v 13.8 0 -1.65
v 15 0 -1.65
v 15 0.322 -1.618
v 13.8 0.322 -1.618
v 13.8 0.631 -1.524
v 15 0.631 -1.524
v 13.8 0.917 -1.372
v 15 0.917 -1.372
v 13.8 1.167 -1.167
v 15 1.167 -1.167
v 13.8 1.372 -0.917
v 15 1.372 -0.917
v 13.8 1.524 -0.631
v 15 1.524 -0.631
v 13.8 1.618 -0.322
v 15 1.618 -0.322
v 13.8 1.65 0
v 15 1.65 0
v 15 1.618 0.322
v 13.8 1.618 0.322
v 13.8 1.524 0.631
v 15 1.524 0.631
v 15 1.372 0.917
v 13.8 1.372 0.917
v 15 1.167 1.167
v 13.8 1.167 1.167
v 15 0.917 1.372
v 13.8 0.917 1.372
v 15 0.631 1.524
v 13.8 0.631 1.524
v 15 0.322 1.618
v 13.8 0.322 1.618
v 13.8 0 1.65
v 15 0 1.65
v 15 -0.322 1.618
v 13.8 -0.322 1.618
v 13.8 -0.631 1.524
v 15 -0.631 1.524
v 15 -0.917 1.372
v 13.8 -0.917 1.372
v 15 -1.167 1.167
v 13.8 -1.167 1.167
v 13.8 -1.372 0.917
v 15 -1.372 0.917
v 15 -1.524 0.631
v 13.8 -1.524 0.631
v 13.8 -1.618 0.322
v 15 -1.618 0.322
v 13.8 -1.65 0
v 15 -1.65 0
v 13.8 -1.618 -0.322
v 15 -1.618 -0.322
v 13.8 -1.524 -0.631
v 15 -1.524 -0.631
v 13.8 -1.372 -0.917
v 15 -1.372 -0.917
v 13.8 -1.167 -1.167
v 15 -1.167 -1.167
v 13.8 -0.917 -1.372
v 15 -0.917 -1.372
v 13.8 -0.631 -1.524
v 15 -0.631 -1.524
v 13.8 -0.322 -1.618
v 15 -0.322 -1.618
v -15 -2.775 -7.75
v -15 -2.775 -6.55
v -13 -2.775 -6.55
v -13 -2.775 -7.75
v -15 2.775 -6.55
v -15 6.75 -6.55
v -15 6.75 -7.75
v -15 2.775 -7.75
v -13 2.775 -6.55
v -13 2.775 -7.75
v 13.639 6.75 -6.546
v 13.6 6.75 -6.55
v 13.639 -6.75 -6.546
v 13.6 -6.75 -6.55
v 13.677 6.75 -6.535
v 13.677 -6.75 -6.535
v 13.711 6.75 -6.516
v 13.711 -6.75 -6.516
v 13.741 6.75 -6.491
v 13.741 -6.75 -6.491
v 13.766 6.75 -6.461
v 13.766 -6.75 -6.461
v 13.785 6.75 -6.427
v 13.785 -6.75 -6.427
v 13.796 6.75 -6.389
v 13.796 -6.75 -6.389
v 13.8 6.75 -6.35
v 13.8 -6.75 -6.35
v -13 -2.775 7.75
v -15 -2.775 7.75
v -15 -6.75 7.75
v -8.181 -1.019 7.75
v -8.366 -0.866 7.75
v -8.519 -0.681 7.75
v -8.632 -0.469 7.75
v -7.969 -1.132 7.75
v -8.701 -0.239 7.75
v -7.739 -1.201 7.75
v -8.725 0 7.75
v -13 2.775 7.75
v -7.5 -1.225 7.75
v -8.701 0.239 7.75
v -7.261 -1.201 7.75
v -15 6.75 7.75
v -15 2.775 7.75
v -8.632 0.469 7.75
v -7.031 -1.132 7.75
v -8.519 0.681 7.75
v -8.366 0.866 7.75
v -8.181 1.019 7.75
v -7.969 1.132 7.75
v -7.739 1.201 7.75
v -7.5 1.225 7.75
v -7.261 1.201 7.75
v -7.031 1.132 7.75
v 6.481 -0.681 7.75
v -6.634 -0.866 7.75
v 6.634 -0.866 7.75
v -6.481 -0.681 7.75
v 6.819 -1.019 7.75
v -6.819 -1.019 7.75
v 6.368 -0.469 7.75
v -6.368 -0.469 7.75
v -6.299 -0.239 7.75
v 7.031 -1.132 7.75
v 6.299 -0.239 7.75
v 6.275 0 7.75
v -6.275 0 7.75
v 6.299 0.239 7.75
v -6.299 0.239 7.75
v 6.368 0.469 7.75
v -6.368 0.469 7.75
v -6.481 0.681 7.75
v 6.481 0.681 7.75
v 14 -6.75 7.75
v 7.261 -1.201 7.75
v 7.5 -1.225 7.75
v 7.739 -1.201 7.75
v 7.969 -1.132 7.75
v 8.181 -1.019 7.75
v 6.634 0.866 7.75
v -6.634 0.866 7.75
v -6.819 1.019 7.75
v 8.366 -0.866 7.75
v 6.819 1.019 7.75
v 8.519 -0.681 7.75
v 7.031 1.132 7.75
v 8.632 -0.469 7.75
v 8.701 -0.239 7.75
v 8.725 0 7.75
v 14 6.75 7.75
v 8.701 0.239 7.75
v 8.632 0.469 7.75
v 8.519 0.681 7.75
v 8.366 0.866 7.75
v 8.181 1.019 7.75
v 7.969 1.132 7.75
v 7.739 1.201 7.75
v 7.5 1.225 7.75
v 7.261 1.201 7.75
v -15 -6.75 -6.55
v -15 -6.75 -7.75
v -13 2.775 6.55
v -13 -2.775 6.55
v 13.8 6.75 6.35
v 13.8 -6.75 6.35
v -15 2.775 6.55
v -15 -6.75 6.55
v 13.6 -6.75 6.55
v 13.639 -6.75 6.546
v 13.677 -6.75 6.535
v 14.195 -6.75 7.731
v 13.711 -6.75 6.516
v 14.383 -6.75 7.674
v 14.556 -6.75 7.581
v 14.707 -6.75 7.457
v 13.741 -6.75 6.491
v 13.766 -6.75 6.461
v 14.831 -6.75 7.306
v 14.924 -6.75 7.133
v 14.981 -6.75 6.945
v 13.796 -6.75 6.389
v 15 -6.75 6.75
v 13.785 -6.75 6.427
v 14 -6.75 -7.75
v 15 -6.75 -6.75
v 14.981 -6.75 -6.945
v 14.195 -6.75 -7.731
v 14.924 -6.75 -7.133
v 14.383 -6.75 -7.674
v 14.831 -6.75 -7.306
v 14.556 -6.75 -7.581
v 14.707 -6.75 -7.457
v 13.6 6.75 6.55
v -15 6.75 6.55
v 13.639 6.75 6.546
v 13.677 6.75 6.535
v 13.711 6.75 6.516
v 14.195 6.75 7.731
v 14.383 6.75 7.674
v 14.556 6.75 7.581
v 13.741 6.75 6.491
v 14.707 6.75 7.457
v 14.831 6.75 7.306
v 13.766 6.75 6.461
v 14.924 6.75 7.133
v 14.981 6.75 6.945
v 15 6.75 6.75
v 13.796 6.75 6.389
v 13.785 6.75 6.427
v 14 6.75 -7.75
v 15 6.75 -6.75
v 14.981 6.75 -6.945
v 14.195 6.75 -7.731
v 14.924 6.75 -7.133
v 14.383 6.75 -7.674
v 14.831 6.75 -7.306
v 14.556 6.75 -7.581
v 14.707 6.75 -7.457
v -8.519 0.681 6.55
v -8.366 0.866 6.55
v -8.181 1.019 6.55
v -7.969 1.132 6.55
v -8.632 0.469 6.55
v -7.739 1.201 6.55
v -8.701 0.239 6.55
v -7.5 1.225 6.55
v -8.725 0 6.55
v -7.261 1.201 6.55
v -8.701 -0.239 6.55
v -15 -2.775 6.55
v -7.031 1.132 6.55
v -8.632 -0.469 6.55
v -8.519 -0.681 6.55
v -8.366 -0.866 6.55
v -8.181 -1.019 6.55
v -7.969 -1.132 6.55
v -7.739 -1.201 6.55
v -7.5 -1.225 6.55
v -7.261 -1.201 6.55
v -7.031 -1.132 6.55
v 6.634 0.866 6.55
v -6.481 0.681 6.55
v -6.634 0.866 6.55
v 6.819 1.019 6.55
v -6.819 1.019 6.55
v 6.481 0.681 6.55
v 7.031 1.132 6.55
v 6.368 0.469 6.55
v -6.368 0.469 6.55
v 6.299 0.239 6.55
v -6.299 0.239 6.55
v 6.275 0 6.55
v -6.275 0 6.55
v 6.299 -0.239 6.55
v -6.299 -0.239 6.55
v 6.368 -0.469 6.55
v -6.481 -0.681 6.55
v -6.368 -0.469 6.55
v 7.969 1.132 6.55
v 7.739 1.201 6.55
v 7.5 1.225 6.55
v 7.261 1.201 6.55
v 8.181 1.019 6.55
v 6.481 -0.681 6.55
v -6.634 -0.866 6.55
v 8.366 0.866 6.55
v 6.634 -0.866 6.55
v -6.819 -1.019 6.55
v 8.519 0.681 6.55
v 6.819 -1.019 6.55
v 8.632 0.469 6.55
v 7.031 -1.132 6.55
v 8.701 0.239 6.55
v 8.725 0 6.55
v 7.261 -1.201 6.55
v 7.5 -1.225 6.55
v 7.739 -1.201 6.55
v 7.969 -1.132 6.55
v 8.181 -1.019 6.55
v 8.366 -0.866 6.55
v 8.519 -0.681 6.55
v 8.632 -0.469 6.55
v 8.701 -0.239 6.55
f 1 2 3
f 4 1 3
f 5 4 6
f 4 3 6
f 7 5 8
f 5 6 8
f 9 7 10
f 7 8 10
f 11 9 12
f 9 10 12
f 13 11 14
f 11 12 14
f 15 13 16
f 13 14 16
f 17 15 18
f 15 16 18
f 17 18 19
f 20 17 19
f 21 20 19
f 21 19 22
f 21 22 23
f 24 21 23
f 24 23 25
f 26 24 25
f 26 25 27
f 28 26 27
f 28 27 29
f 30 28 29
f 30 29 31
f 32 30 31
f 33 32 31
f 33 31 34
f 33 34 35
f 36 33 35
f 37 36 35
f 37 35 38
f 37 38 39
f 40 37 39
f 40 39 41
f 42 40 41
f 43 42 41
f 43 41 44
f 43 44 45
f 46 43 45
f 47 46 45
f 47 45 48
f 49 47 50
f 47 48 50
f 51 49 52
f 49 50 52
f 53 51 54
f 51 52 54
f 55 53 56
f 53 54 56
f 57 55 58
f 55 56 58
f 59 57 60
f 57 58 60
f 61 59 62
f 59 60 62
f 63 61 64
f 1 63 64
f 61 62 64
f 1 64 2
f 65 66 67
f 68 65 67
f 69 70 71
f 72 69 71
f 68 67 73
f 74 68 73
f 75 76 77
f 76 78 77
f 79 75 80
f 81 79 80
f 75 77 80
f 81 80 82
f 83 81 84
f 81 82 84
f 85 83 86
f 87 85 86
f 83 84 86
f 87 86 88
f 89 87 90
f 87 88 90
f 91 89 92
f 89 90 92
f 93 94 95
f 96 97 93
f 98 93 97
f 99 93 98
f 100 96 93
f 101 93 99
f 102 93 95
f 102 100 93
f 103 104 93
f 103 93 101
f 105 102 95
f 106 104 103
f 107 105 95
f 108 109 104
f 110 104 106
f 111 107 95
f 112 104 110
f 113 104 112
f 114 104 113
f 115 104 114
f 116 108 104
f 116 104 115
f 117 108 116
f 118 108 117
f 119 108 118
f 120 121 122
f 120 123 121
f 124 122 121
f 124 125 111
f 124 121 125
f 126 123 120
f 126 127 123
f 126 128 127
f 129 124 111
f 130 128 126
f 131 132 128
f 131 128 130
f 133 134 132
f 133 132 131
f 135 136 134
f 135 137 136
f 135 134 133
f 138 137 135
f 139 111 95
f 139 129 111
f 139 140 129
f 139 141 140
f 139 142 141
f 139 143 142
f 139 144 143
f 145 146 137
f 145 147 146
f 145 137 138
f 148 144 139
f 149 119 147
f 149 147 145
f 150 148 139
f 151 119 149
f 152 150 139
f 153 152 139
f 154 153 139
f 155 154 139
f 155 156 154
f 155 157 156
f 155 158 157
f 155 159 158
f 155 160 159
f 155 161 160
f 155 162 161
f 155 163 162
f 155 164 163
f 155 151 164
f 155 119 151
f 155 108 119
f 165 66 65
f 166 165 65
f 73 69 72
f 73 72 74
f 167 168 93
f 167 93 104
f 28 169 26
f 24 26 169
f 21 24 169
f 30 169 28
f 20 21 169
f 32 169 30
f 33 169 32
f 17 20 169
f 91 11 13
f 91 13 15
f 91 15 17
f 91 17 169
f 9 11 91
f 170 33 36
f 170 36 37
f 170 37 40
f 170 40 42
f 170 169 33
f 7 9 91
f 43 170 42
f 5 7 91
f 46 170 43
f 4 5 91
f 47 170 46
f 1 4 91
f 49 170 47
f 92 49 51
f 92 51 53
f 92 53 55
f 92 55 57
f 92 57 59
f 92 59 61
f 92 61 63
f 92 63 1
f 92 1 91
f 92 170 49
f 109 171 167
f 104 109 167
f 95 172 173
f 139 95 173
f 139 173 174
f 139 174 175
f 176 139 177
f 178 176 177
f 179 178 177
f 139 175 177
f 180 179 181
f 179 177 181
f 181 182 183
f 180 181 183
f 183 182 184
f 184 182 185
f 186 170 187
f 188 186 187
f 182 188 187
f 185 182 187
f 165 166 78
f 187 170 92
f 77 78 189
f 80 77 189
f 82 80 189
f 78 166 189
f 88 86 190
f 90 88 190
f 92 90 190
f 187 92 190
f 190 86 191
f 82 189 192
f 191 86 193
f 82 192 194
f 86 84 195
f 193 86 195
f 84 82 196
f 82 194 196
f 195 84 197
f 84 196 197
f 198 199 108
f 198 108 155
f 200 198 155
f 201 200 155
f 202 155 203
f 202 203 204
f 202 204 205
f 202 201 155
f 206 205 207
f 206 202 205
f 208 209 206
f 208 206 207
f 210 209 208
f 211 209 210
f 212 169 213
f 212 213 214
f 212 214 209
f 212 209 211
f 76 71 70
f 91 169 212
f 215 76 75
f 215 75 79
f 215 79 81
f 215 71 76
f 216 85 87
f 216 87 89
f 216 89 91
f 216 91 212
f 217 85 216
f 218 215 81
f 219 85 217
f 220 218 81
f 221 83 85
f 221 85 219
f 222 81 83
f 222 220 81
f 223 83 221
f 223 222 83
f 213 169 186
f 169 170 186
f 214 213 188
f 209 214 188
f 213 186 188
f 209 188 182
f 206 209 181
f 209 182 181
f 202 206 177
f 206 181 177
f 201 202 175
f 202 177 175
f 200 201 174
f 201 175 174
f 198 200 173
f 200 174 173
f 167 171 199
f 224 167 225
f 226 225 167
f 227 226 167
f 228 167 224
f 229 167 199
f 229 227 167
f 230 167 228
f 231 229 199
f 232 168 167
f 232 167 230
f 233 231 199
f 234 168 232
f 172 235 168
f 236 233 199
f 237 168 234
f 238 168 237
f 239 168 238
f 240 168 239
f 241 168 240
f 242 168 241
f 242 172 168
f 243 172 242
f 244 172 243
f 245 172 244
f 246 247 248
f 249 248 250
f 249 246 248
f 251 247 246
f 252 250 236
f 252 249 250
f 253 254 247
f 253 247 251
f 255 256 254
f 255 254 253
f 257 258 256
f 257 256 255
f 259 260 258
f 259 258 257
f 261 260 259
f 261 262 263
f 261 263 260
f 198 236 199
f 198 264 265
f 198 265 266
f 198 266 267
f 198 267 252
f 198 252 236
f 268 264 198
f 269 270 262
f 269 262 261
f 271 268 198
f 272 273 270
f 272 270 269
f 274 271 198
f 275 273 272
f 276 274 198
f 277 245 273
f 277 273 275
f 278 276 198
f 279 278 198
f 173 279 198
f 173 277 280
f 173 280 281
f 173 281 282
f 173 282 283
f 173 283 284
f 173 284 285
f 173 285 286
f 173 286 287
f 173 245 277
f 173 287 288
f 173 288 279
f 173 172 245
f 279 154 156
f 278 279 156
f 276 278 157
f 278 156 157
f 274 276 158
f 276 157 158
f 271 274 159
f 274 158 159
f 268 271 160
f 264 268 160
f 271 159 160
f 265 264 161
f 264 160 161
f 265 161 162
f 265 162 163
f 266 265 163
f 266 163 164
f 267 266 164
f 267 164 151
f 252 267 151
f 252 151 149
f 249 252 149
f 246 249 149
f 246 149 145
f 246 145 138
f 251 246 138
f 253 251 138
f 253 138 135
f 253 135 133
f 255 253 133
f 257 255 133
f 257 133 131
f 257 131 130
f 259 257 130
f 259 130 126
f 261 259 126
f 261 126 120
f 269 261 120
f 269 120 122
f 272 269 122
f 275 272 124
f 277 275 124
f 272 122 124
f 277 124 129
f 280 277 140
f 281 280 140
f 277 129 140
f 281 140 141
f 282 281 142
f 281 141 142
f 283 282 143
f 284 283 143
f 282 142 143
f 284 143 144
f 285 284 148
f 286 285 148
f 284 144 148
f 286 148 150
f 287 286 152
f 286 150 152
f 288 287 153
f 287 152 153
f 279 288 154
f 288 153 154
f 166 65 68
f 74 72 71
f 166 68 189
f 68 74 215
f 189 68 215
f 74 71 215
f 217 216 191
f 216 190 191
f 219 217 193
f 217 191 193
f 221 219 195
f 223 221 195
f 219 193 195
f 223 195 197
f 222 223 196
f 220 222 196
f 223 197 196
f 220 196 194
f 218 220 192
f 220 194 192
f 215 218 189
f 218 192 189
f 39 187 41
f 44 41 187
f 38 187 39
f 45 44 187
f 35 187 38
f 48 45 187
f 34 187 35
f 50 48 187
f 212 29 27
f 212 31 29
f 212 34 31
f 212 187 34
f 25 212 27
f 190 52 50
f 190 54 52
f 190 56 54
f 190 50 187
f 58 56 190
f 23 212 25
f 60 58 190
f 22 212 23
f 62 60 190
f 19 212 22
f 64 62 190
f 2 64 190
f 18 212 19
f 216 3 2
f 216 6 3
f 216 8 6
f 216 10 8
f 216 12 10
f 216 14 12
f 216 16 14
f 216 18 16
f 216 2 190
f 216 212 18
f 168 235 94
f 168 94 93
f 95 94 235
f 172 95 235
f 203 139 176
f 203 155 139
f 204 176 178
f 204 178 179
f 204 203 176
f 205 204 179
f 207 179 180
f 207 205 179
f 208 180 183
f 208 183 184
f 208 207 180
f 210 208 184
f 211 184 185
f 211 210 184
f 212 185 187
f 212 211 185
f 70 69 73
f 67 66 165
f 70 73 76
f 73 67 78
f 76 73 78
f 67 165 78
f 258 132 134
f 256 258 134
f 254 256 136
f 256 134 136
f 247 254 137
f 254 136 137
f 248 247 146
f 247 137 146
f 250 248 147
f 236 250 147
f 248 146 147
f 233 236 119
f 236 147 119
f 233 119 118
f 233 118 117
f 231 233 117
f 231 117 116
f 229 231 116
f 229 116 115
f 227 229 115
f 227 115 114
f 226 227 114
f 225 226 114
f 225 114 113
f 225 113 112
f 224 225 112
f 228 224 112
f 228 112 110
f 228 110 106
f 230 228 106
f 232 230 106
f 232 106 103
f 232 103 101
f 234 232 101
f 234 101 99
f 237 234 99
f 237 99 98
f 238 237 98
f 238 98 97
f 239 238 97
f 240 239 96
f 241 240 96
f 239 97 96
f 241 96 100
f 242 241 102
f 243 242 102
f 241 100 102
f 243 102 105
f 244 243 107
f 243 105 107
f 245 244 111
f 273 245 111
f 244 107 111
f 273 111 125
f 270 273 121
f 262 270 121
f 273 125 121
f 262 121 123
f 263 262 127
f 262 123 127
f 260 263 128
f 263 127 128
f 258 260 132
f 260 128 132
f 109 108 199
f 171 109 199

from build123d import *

# Parameters (mm, degrees)
CROQUIS1_W                 = 30
CROQUIS1_H                 = 15.5
SALIENTE_EXTRUIR1_DEPTH    = 6.75
CROQUIS2_W                 = 28.8
CROQUIS2_H                 = 13.1
CORTAR_EXTRUIR1_DEPTH      = 7.75
CORTAR_EXTRUIR1_DEPTH_BACK = 7.75
CORTAR_EXTRUIR2_REACH      = 32
CROQUIS3_R                 = 1.65
REDONDEO1_R                = 1
REDONDEO2_R                = 0.2
CROQUIS4_W                 = 2
CROQUIS4_H                 = 5.55
CORTAR_EXTRUIR3_DEPTH      = 8.75
CORTAR_EXTRUIR3_DEPTH_BACK = 8.75
CORTAR_EXTRUIR4_REACH      = 17.5
CROQUIS5_R                 = 1.225


with BuildPart() as part:
    # Croquis1 → Saliente-Extruir1 (new body, symmetric)
    with BuildSketch(Plane(origin=(0, 0, 0), x_dir=(1, 0, 0), z_dir=(0, 1, 0))):
        Rectangle(CROQUIS1_W, CROQUIS1_H)
    extrude(amount=SALIENTE_EXTRUIR1_DEPTH, both=True)

    # Croquis2 → Cortar-Extruir1 (cut, two sides)
    with BuildSketch(Plane(origin=(0, 0, 0), x_dir=(1, 0, 0), z_dir=(0, 1, 0))) as cortar_extruir1_sk:
        with Locations((-0.6, 0)):
            Rectangle(CROQUIS2_W, CROQUIS2_H)
    extrude(amount=CORTAR_EXTRUIR1_DEPTH, mode=Mode.SUBTRACT)
    extrude(cortar_extruir1_sk.sketch, amount=-CORTAR_EXTRUIR1_DEPTH_BACK, mode=Mode.SUBTRACT)

    # Croquis3 → Cortar-Extruir2 (cut, up to next)
    with BuildSketch(Plane(origin=(15, 0, 0), x_dir=(0, 0, -1), z_dir=(1, 0, 0)), mode=Mode.PRIVATE) as cortar_extruir2_sk1:
        Circle(CROQUIS3_R)
    cortar_extruir2_tool1 = extrude(cortar_extruir2_sk1.sketch, amount=-CORTAR_EXTRUIR2_REACH, mode=Mode.PRIVATE) & part.part
    add(cortar_extruir2_tool1.solids().sort_by_distance((15, 0, 0))[0], mode=Mode.SUBTRACT)

    # Redondeo1
    redondeo1_edges = [part.edges().sort_by_distance(p)[0] for p in [
        (15, 0, -7.75),
        (15, 0, 7.75),
    ]]
    fillet(redondeo1_edges, radius=REDONDEO1_R)

    # Redondeo2
    redondeo2_edges = [part.edges().sort_by_distance(p)[0] for p in [
        (13.8, 0, -6.55),
        (13.8, 0, 6.55),
    ]]
    fillet(redondeo2_edges, radius=REDONDEO2_R)

    # Croquis4 → Cortar-Extruir3 (cut, two sides)
    with BuildSketch(Plane.XY) as cortar_extruir3_sk:
        with Locations((-14, 0)):
            Rectangle(CROQUIS4_W, CROQUIS4_H)
    extrude(amount=CORTAR_EXTRUIR3_DEPTH, mode=Mode.SUBTRACT)
    extrude(cortar_extruir3_sk.sketch, amount=-CORTAR_EXTRUIR3_DEPTH_BACK, mode=Mode.SUBTRACT)

    # Croquis5 → Cortar-Extruir4 (cut, up to next)
    with BuildSketch(Plane.XY.offset(7.75), mode=Mode.PRIVATE) as cortar_extruir4_sk1:
        with Locations((-7.5, 0)):
            Circle(CROQUIS5_R)
    cortar_extruir4_tool1 = extrude(cortar_extruir4_sk1.sketch, amount=-CORTAR_EXTRUIR4_REACH, mode=Mode.PRIVATE) & part.part
    add(cortar_extruir4_tool1.solids().sort_by_distance((-7.5, 0, 7.75))[0], mode=Mode.SUBTRACT)
    # Croquis5 → Cortar-Extruir4 (cut, up to next)
    with BuildSketch(Plane.XY.offset(7.75), mode=Mode.PRIVATE) as cortar_extruir4_sk2:
        with Locations((7.5, 0)):
            Circle(CROQUIS5_R)
    cortar_extruir4_tool2 = extrude(cortar_extruir4_sk2.sketch, amount=-CORTAR_EXTRUIR4_REACH, mode=Mode.PRIVATE) & part.part
    add(cortar_extruir4_tool2.solids().sort_by_distance((7.5, 0, 7.75))[0], mode=Mode.SUBTRACT)


solid = part.part
